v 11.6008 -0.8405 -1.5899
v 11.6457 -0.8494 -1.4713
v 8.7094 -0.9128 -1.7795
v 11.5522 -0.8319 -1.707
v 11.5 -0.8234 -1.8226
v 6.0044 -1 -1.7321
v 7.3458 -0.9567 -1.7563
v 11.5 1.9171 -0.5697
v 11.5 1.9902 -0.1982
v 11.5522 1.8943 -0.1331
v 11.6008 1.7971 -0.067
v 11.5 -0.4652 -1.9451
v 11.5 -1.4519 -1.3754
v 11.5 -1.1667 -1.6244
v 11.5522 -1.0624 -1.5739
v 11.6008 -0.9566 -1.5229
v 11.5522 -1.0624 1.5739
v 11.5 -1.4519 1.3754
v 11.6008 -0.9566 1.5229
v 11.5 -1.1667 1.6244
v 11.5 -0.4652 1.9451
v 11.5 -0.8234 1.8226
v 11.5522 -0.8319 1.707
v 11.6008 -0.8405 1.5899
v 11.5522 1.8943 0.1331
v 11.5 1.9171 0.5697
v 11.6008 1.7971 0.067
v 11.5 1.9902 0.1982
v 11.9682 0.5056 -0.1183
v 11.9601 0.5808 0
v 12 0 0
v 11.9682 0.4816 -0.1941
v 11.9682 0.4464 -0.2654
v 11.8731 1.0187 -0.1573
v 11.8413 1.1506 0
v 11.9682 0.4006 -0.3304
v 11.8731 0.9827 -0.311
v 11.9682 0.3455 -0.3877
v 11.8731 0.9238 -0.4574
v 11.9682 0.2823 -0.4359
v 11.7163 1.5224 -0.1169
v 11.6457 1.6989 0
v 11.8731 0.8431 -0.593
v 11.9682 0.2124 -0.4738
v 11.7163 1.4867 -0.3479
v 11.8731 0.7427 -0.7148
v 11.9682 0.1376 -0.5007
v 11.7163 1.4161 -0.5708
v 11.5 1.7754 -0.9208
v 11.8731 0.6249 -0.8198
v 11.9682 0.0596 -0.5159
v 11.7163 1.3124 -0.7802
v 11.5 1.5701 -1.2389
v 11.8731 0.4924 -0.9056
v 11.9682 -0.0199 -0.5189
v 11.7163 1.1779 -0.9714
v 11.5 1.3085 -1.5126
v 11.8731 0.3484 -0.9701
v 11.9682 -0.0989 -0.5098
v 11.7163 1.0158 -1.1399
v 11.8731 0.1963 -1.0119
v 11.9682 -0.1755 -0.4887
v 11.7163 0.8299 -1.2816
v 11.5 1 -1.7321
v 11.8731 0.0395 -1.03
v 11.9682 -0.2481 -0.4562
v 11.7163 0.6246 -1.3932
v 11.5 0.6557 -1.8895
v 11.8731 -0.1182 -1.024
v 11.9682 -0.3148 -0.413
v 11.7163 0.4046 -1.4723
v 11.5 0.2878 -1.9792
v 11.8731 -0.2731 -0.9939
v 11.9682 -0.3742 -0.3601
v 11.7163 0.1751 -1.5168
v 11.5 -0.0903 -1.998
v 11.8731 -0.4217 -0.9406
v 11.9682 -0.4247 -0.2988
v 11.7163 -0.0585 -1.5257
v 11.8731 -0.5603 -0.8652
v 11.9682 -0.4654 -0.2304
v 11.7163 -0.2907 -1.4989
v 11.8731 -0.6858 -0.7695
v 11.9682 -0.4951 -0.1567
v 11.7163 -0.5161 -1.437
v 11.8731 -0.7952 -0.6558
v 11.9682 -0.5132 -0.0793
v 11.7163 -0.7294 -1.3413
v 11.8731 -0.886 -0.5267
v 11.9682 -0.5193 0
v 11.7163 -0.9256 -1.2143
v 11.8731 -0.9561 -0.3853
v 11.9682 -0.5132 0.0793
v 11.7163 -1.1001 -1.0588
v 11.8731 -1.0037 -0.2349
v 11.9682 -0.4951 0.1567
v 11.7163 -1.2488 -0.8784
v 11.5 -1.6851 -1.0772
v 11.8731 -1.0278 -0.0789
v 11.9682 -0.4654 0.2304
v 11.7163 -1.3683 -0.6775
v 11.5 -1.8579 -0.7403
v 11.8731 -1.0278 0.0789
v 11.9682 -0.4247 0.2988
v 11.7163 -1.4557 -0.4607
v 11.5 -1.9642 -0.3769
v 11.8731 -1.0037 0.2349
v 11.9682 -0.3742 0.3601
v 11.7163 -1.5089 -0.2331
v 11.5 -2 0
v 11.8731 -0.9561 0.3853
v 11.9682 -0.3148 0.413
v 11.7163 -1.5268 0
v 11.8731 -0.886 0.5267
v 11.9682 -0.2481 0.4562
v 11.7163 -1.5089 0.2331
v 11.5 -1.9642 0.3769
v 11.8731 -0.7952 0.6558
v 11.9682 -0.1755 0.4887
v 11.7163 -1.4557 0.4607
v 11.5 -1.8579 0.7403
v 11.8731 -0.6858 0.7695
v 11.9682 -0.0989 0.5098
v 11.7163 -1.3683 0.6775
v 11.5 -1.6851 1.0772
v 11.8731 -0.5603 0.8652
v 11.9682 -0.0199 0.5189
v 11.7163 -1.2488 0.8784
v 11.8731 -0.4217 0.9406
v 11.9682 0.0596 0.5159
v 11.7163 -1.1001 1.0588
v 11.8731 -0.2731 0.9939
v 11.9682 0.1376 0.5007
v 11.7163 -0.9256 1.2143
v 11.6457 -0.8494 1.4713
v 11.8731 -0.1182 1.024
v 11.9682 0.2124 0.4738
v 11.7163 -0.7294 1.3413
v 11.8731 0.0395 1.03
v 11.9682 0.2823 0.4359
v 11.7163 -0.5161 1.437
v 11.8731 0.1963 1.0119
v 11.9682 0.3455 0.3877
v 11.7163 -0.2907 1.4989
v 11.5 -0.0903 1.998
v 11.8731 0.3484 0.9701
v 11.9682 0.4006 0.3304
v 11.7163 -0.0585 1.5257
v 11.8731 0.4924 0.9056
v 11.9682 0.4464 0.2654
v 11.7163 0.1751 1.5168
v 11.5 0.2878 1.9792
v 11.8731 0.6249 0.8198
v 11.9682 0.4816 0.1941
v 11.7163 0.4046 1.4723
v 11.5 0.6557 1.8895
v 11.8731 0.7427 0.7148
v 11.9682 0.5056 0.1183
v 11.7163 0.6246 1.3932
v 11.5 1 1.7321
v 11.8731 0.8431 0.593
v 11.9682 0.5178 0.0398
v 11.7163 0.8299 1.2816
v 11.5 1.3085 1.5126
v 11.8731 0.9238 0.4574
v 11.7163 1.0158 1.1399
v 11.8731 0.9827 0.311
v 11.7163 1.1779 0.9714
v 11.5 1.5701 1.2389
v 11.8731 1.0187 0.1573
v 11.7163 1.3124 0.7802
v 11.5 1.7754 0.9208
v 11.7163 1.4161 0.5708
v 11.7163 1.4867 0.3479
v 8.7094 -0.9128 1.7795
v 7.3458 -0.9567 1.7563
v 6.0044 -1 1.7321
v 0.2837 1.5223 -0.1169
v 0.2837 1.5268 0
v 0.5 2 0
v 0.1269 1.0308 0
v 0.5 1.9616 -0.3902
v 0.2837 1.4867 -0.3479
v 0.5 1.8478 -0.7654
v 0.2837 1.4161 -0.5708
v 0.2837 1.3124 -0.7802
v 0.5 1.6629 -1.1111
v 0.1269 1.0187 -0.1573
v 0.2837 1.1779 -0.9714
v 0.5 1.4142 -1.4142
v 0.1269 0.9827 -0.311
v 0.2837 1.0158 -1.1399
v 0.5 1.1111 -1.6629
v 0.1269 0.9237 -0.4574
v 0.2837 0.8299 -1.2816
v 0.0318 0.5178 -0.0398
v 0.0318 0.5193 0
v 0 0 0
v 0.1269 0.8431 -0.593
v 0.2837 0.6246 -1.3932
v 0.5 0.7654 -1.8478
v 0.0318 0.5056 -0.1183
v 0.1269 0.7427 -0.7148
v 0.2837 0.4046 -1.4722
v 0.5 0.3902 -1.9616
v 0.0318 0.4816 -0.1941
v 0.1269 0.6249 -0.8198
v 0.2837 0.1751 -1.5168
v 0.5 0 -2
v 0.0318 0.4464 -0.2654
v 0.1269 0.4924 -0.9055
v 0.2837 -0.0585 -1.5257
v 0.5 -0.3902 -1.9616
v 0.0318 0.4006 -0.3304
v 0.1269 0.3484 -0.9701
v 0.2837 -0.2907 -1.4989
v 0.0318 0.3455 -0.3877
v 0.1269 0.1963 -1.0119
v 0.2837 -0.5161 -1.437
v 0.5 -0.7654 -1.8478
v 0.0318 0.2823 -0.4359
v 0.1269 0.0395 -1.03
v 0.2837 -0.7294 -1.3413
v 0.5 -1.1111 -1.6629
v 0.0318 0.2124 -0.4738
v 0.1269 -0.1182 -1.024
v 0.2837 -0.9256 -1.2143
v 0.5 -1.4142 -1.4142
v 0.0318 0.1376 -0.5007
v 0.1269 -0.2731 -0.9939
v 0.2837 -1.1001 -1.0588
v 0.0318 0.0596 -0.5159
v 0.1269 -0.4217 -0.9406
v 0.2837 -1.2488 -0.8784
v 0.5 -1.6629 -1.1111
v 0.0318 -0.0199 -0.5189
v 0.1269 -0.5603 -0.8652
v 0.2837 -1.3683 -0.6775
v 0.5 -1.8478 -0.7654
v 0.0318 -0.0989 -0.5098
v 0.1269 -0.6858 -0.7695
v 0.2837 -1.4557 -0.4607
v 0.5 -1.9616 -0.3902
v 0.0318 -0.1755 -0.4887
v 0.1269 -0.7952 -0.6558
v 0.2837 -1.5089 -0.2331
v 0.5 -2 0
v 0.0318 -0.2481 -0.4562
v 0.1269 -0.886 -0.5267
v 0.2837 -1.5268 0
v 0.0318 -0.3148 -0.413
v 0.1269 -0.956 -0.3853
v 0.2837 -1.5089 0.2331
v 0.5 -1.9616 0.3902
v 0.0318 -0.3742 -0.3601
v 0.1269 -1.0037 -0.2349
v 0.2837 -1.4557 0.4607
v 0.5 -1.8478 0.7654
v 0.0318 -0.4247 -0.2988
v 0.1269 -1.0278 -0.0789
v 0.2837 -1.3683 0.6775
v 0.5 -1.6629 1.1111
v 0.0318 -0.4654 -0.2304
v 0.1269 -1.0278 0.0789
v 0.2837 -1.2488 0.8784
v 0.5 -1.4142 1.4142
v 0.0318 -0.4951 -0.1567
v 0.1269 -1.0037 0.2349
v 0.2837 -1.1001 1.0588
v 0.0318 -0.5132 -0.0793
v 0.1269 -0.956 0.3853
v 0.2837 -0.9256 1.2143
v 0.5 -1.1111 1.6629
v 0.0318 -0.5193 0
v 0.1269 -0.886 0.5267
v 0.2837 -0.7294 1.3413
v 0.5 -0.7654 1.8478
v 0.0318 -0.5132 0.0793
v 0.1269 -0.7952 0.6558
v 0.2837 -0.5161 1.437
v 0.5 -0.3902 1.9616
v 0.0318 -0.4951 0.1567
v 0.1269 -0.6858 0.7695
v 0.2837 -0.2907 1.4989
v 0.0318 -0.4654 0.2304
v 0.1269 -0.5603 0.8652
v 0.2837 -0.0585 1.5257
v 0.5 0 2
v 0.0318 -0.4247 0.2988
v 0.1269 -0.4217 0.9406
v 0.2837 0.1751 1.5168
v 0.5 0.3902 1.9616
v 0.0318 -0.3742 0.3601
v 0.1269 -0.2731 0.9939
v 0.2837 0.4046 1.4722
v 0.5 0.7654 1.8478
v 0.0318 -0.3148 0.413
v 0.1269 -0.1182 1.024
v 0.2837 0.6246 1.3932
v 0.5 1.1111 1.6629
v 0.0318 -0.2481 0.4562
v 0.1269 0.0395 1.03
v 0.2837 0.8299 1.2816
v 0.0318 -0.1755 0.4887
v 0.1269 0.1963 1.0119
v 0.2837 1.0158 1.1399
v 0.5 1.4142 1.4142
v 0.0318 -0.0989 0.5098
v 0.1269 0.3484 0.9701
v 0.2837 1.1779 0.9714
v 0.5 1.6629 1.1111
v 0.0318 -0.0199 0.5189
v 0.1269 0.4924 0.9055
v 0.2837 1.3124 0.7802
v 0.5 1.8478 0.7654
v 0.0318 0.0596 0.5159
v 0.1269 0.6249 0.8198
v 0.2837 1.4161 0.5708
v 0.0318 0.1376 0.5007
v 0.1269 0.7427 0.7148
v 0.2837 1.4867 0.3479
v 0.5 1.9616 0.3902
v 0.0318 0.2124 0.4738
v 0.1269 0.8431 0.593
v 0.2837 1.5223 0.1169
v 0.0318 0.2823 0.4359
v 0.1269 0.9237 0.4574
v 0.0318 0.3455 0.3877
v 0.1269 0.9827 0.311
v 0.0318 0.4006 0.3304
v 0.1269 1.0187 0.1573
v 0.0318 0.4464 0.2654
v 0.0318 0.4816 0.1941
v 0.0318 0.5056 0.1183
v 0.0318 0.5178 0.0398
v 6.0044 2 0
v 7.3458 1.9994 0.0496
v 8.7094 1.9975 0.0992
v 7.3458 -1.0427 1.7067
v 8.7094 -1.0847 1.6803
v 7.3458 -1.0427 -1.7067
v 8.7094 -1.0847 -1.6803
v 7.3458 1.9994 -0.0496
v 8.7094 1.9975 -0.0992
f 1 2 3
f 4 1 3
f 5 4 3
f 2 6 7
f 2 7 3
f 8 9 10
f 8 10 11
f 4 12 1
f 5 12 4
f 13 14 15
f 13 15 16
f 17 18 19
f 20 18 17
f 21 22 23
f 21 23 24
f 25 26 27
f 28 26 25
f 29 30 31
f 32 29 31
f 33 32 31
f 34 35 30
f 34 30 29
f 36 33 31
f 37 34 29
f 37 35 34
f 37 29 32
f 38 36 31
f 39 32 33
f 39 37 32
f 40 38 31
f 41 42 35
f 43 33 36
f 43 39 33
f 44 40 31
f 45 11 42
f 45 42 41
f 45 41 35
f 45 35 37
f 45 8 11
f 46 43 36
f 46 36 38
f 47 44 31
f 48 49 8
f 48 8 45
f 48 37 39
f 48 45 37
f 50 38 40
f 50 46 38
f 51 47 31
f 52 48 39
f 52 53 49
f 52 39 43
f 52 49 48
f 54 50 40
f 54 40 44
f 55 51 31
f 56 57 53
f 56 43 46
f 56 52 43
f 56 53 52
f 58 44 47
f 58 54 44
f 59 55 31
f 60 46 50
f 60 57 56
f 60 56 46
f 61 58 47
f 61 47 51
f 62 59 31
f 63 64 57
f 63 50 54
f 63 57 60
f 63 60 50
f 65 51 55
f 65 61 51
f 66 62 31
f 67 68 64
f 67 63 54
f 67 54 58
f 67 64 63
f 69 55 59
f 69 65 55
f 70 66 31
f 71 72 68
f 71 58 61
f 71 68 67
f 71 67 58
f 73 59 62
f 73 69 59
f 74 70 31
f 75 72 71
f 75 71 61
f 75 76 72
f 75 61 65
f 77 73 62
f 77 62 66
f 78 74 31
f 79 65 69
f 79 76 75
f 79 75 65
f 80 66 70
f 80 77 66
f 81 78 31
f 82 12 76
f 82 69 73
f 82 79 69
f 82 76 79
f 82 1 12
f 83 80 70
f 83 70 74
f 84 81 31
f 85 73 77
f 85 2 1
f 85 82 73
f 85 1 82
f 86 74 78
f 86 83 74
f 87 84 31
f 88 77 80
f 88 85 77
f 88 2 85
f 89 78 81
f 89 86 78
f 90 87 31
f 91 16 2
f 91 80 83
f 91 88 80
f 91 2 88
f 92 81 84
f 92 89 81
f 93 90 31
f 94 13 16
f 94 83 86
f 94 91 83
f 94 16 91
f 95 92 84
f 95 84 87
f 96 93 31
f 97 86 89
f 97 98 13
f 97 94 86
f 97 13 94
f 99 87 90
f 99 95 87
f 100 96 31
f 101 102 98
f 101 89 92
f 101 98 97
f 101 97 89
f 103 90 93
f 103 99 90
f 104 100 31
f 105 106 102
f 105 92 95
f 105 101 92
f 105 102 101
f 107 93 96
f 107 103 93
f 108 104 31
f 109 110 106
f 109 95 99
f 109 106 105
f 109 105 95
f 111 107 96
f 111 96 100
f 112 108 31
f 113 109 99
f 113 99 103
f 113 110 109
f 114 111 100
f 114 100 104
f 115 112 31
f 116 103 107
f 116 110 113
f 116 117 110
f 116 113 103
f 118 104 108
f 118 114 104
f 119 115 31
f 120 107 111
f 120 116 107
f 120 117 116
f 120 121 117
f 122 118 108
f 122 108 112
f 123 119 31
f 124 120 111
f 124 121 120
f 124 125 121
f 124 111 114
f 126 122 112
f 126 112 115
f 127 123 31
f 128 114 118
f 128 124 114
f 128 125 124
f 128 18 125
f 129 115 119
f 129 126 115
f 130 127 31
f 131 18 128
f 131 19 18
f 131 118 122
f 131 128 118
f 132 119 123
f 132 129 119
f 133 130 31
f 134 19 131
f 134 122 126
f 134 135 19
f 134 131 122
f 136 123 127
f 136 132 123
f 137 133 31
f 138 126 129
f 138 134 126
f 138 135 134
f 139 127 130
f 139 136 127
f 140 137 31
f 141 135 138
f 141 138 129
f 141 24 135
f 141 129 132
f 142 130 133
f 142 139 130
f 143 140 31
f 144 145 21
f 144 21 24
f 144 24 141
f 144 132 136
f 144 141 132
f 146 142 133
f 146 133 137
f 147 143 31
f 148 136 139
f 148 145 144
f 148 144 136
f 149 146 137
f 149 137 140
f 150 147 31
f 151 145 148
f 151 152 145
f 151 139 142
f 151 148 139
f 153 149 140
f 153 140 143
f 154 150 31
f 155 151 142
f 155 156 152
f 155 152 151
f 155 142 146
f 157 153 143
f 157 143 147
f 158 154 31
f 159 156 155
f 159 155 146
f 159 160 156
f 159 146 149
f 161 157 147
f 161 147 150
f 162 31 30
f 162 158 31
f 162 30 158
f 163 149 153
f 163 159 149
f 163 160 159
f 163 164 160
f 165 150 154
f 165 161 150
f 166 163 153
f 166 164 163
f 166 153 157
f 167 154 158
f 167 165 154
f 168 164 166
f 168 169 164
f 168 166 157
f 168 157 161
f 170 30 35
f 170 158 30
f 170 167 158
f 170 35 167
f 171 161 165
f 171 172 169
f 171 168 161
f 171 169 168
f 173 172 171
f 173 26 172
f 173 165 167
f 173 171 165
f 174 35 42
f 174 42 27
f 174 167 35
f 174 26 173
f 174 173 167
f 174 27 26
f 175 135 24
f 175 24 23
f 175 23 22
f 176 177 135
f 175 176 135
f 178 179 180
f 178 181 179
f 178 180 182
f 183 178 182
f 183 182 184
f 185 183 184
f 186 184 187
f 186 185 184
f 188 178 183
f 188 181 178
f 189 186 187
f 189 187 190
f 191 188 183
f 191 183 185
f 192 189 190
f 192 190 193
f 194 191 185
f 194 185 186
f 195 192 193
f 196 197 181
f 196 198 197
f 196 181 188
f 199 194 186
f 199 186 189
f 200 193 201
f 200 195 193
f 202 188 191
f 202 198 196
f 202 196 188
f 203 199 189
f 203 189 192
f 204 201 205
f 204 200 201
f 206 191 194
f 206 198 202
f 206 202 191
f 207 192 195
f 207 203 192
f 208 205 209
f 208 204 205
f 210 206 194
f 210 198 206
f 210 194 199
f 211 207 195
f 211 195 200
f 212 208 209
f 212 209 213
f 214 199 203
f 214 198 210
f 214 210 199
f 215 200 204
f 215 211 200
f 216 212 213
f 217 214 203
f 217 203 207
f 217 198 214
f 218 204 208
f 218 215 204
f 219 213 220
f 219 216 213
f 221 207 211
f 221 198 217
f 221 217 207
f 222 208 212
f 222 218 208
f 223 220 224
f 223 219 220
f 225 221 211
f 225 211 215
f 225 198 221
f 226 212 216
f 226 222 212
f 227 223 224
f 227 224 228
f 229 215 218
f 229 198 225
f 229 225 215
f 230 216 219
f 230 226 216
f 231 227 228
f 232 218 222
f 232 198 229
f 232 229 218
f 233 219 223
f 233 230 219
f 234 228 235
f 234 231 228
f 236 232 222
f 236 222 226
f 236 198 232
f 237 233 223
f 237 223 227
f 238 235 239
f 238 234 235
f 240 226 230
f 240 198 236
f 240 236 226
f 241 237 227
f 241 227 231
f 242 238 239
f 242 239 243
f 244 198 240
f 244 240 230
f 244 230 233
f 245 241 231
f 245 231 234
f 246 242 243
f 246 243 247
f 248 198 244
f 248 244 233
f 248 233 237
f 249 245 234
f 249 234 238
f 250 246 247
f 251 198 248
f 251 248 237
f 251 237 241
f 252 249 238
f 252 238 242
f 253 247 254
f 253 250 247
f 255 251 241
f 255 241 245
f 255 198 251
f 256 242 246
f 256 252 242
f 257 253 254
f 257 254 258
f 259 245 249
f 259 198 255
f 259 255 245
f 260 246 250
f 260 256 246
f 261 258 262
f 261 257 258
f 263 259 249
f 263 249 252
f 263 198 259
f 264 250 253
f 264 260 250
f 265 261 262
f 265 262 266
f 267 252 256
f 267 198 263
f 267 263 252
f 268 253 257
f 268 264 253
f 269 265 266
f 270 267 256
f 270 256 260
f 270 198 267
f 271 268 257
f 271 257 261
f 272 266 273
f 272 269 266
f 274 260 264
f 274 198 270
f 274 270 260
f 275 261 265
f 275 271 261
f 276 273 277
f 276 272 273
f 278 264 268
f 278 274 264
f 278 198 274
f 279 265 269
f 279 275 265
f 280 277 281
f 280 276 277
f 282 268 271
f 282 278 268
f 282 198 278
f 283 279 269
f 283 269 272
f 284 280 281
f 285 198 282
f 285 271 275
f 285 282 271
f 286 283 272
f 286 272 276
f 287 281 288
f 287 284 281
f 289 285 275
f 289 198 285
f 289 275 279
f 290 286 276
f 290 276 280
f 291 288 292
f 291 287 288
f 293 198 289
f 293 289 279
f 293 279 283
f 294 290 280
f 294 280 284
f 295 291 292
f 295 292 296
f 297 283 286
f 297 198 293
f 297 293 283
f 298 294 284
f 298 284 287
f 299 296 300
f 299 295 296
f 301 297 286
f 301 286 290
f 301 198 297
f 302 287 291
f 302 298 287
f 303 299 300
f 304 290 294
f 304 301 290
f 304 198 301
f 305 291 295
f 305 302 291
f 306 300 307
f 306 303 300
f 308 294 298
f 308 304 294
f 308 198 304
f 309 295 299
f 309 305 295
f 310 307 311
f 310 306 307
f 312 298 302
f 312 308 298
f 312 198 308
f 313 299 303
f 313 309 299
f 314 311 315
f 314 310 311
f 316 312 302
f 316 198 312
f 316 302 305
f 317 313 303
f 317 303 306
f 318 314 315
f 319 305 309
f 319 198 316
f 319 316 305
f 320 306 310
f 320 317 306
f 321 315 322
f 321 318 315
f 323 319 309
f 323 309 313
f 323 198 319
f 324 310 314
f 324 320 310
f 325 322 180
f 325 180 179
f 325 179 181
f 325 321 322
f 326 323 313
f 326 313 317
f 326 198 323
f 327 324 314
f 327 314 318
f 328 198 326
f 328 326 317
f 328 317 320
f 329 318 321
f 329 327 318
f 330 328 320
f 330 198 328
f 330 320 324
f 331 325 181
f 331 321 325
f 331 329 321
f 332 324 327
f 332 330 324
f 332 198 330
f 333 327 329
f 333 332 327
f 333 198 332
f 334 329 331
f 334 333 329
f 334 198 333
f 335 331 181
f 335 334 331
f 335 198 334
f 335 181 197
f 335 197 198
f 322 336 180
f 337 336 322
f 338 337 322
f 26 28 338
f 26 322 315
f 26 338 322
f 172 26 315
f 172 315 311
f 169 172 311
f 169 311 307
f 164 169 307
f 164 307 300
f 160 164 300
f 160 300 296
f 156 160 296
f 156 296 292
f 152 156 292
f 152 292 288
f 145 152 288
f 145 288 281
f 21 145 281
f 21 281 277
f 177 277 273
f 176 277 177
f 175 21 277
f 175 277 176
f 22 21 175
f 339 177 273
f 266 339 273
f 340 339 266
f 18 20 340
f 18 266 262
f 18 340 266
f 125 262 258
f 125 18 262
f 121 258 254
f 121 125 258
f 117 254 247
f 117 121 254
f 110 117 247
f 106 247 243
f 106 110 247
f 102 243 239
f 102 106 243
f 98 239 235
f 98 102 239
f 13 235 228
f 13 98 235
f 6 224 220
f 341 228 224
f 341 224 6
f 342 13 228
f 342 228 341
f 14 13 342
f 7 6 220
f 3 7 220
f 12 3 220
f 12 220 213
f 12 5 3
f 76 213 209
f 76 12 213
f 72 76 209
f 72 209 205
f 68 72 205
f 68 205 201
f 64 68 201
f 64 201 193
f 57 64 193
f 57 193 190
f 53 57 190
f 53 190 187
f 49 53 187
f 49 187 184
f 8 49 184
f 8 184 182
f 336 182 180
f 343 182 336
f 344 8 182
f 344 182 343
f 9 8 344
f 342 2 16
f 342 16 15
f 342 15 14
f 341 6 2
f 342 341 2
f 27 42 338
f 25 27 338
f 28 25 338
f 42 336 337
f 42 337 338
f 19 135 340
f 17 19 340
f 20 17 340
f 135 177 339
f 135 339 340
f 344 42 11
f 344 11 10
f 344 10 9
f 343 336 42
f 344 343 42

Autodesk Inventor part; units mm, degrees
ref_plane "YZ Plane" through (0, 0, 0) normal (1, 0, 0) x (0, 1, 0)
sketch "Skizze1" plane through (0, 0, 0) normal (0, 0, 1) x (1, 0, 0)
  line L0 (0, 0) -> (12, 0)
  line L1 (0.5, 2) -> (11.5, 2)
  arc A0 (0.5, 2) -> (0, 0) centre (4.25, 0) ccw
  arc A1 (12, 0) -> (11.5, 2) centre (7.75, 0) ccw
  line L2 (12, 0) -> (12, 1.68) construction
  line L3 (12, 1.68) -> (6, 2) construction
  line L4 (-12.8617, 0) -> (72.8617, 0) projected
  line L5 (0, 12.1847) -> (0, -2.0308) projected
  point P0 (6, 0)
  dimension "d0" = 4
  dimension "d1" = 12
  dimension "d2" = 3.36
  dimension "d12" = 6
  dimension "d17" = 0.5
  dimension "d18" = 0.5
revolve "Körper" add sketch "Skizze1" angle 360 about axis through (0, 0, 0) along (1, 0, 0)
ref_plane "Work Plane1" through (12, 0, 0) normal (1, 0, 0) x (0, 1, 0)
sketch "Skizze2" plane through (12, 0, 0) normal (1, 0, 0) x (0, 1, 0)
  line L0 (0, -14) -> (0, 14) projected
ref_plane "Work Plane2" through (12, 0, -10) normal (0.9986, -0.0533, 0) x (0.0533, 0.9986, 0)
sketch "Skizze3" plane through (12, 0, -10) normal (0.9986, -0.0533, 0) x (0.0533, 0.9986, 0)
  ellipse E0 centre (-0.0266, 10) end of major axis (-0.0266, 12) minor radius 1.9972 projected
  line L0 (-0.3195, 10) -> (1.6776, 10) projected
  line L1 (1.6776, 10) -> (1.9607, 10.1982)
  line L2 (1.6776, 10) -> (1.9607, 9.8018)
  arc A0 (1.9607, 9.8018) -> (1.9607, 10.1982) centre (-0.0266, 10) ccw
  dimension "d7" = 70
extrude "Nut" cut sketch "Skizze3" against normal up to next contours L2 L1 E0 picked at (1.8688, 9.9009)
pattern_circular "Nuten" count 3 over 360 about axis through (6, 0, 0) along (1, 0, 0) of "Nut"
equation "\"d0\" = NND"
equation "\"d1\" = NLG"
equation "\"d2\" = 0.84 * NND"
equation "\"d17\" = KAH"
equation "\"d18\" = KAH"
equation "\"d8\" = 0.5 * NLG"
equation "\"NND\" = 4"
equation "\"NLG\" = 12"
equation "\"KAH\" = 0.5"
equation "\"d3\" = NLG"
equation "\"d6\" = -d5"
equation "\"FAC\" = 0.5"
equation "\"NND1\" = 4.25"
equation "\"NLG1\" = 11"
properties part number "ISO 8745 - 4 x 12" material "Edelstahl, austenitisch"
